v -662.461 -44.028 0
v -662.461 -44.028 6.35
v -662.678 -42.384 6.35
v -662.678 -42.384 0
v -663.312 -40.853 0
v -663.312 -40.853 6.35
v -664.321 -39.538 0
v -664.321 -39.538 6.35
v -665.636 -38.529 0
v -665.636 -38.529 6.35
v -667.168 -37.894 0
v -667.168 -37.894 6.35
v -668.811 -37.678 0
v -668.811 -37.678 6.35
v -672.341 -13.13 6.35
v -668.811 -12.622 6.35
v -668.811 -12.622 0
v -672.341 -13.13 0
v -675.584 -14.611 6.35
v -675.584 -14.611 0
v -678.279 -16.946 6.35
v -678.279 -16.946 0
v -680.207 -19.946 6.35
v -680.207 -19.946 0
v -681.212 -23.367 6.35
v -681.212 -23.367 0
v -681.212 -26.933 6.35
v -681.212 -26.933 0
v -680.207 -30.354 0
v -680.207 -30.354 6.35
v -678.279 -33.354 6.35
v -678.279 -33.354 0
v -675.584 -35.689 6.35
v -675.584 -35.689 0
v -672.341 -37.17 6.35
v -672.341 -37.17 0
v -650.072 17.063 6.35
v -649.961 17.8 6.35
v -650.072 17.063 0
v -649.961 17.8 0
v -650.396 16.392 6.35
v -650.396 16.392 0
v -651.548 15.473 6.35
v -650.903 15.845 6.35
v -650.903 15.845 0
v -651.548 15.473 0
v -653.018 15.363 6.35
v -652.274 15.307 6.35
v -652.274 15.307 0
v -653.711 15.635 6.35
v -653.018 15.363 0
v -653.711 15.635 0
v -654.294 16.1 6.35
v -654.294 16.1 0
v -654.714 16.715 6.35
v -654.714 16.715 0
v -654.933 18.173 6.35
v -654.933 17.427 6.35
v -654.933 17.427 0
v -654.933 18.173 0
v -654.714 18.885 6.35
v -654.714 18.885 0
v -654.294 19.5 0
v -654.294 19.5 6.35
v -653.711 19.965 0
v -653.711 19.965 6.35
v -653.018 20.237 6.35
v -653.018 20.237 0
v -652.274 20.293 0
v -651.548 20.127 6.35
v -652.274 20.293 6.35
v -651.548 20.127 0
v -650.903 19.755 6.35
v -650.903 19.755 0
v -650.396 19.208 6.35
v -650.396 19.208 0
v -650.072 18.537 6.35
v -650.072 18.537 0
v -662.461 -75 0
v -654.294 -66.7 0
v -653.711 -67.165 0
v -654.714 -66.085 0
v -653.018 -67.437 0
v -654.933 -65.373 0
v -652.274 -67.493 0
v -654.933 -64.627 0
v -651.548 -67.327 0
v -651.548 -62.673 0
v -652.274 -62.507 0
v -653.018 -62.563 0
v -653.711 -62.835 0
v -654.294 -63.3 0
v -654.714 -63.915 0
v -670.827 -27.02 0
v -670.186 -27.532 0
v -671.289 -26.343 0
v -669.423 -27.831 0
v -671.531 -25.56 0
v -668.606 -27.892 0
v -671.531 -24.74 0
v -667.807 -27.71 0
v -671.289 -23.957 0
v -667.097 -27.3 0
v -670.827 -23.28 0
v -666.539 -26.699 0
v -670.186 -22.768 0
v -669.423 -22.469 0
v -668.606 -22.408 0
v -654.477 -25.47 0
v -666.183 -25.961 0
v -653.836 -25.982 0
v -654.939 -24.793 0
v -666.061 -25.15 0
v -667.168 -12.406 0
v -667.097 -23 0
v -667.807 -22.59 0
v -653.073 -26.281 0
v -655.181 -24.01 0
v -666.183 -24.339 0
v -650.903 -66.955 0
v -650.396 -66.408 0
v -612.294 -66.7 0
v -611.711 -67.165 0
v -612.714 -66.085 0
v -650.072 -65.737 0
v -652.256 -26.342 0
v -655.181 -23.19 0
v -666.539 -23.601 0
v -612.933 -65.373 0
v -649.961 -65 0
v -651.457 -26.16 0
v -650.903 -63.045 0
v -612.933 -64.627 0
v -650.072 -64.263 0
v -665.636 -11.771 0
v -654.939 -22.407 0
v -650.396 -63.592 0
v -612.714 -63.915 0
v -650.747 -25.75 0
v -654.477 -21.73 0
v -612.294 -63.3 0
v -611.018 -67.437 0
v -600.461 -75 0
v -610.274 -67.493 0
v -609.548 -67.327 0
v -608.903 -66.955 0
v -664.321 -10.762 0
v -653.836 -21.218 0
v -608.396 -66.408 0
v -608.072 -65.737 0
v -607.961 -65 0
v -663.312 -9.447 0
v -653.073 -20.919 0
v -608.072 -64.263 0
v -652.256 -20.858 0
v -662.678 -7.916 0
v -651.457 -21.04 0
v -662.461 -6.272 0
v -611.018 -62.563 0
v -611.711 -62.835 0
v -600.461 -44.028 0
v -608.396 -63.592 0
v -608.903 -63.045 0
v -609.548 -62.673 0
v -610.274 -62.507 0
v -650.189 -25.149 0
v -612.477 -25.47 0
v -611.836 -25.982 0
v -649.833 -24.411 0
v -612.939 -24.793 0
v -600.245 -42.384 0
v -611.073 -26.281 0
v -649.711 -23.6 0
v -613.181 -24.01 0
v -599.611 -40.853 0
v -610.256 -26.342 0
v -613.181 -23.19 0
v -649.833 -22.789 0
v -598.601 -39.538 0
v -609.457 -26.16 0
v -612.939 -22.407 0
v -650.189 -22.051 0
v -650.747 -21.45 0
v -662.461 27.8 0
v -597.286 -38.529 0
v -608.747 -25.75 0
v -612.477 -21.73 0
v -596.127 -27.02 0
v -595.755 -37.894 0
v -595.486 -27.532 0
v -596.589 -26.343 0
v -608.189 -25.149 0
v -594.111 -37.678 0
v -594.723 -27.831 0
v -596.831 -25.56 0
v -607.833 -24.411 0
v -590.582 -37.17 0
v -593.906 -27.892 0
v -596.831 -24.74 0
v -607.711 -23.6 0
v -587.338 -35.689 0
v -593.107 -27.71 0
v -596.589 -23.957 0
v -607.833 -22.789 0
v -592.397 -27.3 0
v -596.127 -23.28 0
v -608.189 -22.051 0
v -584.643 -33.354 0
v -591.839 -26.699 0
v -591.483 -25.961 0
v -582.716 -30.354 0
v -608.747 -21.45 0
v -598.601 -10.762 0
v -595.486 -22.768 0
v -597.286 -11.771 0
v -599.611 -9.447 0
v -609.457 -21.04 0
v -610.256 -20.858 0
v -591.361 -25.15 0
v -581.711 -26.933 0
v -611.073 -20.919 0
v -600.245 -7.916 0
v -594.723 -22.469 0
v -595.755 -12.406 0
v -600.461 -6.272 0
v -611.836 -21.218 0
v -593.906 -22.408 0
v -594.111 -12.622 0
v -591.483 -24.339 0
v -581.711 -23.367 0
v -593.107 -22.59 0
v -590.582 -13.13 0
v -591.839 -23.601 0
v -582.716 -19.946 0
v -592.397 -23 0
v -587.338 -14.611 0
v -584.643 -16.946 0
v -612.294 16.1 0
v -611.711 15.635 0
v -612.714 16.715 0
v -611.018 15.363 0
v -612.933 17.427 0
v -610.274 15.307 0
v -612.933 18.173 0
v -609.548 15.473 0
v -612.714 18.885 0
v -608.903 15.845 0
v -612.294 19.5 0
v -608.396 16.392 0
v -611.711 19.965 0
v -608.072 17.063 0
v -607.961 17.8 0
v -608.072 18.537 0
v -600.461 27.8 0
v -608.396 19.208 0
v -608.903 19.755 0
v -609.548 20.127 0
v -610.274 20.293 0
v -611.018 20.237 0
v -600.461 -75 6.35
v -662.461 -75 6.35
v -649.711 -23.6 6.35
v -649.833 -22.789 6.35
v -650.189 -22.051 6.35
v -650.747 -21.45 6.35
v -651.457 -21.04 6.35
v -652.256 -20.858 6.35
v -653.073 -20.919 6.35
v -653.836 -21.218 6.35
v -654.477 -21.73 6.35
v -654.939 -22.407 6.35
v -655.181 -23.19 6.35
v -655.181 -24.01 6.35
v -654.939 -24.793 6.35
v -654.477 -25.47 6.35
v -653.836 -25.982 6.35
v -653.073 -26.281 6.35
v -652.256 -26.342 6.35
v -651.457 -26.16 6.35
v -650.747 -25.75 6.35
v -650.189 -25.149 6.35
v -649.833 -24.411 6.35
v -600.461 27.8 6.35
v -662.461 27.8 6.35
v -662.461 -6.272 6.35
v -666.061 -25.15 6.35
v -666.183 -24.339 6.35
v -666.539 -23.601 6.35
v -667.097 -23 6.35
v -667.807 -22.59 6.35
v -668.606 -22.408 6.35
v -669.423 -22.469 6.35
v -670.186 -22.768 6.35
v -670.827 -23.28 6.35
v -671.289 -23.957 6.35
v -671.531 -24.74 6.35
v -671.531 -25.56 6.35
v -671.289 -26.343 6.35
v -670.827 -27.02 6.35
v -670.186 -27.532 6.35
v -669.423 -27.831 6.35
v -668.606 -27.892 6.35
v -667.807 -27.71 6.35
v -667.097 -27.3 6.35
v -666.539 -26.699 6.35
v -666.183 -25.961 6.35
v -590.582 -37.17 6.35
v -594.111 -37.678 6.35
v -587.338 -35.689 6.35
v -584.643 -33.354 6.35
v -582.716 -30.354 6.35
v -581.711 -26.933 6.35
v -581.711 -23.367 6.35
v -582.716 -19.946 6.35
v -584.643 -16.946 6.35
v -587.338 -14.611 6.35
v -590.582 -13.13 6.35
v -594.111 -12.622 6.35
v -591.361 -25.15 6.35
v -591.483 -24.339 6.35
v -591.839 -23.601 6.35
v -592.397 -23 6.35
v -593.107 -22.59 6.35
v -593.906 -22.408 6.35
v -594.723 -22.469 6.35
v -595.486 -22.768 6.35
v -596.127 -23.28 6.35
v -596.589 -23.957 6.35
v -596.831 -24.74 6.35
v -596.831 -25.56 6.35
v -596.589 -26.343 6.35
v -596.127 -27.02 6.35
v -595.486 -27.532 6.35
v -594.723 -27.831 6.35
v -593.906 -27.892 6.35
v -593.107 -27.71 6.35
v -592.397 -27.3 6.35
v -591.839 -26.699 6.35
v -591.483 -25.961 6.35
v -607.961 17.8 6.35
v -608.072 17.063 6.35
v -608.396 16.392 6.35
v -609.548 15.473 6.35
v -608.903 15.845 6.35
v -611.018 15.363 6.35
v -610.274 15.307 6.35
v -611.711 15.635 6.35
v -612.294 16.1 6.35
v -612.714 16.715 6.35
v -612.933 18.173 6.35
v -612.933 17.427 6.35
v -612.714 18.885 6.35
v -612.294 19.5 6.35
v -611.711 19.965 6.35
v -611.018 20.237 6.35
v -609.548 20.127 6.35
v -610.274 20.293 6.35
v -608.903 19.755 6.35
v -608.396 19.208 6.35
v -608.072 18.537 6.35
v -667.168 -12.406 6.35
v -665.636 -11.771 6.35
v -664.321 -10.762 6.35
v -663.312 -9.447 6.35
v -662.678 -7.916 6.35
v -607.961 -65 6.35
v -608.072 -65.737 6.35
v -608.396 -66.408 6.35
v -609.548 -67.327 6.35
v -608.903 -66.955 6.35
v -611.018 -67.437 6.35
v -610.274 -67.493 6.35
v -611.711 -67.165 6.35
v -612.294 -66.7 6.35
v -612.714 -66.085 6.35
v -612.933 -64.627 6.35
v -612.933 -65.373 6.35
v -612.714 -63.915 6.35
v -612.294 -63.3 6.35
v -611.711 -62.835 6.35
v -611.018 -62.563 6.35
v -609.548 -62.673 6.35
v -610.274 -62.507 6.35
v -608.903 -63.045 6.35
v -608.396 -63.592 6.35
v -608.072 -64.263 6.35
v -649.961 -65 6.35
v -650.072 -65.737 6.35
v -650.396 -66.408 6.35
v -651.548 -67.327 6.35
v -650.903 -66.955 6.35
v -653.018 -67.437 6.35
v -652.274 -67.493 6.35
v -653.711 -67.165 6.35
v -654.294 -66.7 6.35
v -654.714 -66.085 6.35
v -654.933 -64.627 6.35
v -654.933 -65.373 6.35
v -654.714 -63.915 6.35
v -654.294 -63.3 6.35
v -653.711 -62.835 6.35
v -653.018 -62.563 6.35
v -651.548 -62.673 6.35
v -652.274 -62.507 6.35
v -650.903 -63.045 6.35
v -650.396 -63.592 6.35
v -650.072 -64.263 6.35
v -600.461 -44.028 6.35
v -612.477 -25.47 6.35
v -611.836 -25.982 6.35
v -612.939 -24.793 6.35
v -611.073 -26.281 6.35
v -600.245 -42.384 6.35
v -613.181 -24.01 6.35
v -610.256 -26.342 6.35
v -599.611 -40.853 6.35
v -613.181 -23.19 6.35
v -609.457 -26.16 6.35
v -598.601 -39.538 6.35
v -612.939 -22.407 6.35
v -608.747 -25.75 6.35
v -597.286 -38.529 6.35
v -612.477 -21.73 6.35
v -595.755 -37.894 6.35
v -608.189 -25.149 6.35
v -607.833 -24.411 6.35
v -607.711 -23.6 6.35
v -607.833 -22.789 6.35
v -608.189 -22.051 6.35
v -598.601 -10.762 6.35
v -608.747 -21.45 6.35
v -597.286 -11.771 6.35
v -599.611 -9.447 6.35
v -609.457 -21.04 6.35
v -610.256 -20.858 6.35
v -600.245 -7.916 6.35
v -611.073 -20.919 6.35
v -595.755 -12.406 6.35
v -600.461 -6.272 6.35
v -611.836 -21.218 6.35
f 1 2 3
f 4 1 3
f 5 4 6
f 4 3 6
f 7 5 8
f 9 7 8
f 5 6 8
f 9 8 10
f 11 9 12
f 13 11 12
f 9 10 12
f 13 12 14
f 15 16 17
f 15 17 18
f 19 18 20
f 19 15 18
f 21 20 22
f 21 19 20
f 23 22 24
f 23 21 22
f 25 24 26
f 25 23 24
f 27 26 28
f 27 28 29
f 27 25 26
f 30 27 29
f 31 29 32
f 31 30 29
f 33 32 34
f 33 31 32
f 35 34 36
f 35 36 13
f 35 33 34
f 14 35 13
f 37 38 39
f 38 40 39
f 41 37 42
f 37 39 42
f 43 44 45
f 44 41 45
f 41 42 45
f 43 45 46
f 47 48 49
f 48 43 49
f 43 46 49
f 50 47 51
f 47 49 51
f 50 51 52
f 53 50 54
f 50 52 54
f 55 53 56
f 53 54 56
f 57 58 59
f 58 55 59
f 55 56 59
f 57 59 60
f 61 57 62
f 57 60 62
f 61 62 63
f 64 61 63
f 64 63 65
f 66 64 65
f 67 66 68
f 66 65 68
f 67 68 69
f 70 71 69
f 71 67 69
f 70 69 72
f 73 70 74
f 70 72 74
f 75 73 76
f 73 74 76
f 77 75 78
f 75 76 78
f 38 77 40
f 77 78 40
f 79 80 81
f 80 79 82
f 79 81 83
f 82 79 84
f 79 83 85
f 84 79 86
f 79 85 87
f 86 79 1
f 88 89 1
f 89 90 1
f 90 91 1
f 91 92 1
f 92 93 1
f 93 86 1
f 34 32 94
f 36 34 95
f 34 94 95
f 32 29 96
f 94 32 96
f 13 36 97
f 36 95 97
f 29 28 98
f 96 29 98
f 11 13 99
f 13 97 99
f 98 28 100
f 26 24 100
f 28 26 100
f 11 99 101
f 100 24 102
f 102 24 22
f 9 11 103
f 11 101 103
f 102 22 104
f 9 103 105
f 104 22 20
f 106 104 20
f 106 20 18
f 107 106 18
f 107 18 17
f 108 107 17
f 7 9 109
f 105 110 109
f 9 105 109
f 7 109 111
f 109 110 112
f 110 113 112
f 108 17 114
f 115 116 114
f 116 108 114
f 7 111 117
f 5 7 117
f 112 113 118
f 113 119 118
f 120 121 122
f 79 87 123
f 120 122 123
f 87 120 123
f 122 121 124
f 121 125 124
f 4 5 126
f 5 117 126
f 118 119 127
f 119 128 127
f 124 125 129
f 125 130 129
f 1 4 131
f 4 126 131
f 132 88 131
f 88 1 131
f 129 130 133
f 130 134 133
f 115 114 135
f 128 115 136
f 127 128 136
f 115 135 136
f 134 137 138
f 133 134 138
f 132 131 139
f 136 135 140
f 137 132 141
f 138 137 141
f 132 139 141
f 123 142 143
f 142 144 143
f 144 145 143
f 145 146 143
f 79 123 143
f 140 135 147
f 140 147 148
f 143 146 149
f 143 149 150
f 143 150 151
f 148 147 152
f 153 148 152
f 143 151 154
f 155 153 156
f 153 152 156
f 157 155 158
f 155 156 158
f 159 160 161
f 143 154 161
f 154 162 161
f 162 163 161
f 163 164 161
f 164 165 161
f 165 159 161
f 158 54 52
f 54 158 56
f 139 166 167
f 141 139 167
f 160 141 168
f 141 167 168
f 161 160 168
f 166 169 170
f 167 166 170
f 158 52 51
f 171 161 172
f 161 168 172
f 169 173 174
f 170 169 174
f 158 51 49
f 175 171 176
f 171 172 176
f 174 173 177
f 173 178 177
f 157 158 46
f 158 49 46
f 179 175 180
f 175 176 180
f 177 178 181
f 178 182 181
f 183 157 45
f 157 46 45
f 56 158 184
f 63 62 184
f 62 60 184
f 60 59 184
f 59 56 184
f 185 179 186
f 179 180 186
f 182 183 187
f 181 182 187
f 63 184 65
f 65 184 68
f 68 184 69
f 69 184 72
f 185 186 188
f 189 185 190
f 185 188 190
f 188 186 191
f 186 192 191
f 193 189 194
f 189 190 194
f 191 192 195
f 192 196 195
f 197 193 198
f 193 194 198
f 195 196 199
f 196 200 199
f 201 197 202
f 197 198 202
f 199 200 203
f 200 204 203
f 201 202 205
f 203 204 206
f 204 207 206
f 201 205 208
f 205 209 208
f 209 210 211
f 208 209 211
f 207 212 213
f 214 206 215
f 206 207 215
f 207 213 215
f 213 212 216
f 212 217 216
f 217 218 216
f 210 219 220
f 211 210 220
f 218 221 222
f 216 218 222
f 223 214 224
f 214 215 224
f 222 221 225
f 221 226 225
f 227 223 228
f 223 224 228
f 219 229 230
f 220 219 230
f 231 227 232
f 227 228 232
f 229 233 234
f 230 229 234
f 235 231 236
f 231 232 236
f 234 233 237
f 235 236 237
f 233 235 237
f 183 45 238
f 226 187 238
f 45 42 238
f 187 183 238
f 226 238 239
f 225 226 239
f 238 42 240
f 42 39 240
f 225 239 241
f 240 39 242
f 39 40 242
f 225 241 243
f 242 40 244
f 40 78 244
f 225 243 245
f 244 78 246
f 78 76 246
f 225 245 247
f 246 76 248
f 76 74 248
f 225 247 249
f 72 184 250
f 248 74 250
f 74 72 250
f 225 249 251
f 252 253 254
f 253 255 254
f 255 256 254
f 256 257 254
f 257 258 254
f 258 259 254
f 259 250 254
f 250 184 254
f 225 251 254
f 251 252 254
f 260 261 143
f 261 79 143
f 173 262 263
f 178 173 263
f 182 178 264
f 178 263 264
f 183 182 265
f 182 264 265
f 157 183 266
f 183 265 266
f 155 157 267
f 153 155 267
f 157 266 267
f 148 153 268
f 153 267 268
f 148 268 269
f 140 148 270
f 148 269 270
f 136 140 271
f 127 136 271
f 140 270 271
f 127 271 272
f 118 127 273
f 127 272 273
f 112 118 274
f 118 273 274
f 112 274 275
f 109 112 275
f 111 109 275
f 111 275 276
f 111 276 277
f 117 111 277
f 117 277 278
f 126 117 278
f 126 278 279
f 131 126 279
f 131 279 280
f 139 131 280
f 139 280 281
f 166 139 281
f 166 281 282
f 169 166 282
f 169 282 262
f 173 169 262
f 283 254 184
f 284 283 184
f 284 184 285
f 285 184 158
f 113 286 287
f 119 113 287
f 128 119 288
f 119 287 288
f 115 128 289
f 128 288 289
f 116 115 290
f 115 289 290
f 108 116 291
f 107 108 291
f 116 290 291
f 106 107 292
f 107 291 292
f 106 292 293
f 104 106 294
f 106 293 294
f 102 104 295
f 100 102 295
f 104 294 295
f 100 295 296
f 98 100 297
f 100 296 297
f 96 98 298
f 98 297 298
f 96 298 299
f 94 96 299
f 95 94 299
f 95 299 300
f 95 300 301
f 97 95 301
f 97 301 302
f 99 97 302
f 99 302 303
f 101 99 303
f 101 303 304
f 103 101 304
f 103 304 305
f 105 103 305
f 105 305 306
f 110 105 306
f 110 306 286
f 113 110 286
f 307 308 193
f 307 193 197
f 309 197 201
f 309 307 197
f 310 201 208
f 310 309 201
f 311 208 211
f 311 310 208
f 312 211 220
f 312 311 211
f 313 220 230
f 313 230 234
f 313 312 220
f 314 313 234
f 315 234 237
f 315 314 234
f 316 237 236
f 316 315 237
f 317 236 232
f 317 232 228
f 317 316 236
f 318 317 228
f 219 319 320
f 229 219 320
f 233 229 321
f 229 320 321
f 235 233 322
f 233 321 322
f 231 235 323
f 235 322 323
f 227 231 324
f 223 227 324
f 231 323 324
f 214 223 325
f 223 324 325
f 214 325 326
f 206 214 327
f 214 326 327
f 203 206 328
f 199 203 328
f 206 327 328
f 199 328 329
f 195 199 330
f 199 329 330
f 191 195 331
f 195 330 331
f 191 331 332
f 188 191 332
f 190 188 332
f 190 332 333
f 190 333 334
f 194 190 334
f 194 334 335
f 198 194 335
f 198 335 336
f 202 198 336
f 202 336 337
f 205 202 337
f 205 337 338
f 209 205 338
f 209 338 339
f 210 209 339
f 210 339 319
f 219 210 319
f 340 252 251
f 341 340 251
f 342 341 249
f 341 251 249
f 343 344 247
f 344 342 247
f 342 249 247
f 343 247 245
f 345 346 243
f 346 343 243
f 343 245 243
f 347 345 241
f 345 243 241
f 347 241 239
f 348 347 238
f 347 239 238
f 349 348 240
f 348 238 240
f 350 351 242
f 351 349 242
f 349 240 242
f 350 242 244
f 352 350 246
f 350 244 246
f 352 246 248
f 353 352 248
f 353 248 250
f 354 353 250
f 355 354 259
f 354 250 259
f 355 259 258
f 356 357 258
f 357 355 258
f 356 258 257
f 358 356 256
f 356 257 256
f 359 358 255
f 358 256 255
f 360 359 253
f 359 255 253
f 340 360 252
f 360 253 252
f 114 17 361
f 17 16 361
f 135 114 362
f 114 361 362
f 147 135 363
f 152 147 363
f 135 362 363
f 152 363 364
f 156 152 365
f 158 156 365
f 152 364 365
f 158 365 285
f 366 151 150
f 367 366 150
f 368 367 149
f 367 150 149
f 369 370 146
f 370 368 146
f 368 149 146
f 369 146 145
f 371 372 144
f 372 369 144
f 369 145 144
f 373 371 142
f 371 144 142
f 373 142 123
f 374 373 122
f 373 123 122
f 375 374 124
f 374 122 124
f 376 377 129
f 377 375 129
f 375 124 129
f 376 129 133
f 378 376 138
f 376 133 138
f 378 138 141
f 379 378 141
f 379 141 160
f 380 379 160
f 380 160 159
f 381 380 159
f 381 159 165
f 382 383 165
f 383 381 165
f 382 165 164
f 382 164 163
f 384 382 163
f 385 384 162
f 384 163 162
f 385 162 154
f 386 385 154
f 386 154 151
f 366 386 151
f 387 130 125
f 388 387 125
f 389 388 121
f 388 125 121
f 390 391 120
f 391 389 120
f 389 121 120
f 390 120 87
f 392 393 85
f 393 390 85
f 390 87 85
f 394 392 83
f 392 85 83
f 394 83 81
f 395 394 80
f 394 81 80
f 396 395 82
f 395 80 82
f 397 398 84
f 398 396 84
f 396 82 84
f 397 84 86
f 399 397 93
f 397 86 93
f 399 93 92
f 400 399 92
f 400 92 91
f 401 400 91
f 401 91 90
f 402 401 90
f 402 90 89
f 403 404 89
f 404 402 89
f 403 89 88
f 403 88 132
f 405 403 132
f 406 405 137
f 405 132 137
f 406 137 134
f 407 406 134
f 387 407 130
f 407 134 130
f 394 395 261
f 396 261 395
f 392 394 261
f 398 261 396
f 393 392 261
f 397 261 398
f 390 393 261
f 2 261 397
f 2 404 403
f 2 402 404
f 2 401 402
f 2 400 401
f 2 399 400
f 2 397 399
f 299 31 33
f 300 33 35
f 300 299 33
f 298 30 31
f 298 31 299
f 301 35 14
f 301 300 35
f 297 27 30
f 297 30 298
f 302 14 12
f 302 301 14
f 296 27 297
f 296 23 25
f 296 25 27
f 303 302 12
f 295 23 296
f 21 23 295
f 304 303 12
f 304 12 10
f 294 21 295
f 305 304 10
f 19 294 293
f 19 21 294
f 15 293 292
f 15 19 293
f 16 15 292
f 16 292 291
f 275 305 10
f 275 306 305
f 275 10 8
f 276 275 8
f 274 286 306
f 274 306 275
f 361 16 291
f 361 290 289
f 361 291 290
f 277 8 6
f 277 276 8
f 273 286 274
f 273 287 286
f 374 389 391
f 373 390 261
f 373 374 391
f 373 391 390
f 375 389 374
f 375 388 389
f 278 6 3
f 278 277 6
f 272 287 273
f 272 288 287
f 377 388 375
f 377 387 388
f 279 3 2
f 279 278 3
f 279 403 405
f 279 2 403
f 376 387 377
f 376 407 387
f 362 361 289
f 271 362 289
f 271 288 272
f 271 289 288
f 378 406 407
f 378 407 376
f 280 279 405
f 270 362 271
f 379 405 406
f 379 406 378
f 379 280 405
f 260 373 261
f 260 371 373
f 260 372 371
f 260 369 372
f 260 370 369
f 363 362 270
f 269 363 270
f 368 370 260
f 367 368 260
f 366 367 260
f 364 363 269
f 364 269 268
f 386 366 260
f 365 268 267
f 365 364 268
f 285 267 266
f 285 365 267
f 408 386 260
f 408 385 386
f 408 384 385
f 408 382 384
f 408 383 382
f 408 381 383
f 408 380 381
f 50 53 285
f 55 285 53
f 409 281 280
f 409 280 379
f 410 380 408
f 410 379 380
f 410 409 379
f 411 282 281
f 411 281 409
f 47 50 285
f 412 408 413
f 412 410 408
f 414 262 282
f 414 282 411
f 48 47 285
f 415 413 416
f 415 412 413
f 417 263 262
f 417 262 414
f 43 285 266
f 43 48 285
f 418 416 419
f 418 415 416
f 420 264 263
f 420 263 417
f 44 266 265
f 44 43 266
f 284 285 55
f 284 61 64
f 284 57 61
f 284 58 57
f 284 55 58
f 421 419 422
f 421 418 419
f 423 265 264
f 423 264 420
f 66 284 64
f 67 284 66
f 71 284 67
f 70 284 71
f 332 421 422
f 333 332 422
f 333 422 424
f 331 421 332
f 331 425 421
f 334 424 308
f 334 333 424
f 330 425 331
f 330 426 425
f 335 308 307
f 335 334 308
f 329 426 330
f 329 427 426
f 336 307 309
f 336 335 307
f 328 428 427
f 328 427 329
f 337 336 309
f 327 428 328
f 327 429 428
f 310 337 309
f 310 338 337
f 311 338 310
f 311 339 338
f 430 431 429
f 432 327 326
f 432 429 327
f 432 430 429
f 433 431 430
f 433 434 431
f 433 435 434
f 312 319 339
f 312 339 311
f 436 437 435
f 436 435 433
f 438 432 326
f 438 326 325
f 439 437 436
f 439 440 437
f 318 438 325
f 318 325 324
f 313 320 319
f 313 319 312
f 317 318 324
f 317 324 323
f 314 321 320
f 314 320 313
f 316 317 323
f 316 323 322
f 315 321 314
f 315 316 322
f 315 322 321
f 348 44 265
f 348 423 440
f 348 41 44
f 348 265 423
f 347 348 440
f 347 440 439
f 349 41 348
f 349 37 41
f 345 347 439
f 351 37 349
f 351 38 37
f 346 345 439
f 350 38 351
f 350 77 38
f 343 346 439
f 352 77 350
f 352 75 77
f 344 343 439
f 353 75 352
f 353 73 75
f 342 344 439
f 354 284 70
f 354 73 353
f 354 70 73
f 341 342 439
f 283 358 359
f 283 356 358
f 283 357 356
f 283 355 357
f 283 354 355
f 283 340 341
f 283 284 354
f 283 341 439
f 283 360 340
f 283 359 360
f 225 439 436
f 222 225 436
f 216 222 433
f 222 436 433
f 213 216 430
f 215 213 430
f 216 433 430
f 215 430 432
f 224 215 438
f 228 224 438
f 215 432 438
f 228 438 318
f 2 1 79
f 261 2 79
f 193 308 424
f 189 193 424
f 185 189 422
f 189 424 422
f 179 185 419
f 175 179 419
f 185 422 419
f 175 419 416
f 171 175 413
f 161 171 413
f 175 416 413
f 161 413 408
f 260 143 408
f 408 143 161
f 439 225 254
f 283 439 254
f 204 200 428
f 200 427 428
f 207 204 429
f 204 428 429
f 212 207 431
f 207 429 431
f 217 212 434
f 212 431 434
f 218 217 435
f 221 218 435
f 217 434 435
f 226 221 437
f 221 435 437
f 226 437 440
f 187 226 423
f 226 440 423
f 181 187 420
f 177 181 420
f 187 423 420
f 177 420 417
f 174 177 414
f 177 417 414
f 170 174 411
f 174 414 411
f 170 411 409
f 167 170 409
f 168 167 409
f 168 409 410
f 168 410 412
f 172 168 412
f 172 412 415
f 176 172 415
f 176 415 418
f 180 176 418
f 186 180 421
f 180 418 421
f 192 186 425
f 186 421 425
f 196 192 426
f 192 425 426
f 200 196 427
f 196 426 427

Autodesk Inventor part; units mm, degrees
ref_plane "YZ Plane" through (0, 0, 0) normal (1, 0, 0) x (0, 1, 0)
ref_plane "XZ Plane" through (0, 0, 0) normal (0, 1, 0) x (-1, 0, 0)
ref_plane "XY Plane" through (0, 0, 0) normal (0, 0, 1) x (1, 0, 0)
sketch "Sketch1" plane through (0, 0, 0) normal (0, 0, 1) x (1, 0, 0)
  circle A0 centre (-610.4613, 17.8) radius 2.5 projected
  circle A1 centre (-610.4613, 17.8) radius 9.9 construction
  circle A2 centre (-652.4613, 17.8) radius 2.5 projected
  circle A3 centre (-652.4613, 17.8) radius 9.9 construction
  circle A4 centre (-610.4613, -65) radius 2.5 projected
  circle A5 centre (-610.4613, -65) radius 9.9 construction
  circle A6 centre (-652.4613, -65) radius 2.5 projected
  circle A7 centre (-652.4613, -65) radius 9.9 construction
  line L0 (-610.4613, -65) -> (-652.4613, -65) construction
  line L1 (-652.4613, -65) -> (-652.4613, 17.8) construction
  line L2 (-652.4613, 17.8) -> (-610.4613, 17.8) construction
  line L3 (-610.4613, 17.8) -> (-610.4613, -65) construction
  line L4 (-662.4613, -75) -> (-600.4613, -75)
  line L5 (-600.4613, -75) -> (-600.4613, 27.8)
  line L6 (-600.4613, 27.8) -> (-662.4613, 27.8)
  line L7 (-662.4613, 27.8) -> (-662.4613, -75)
  point P0 (0, 0)
  dimension "d0" = 10
extrude "Extrusion1" add sketch "Sketch1" along normal blind 6.35
sketch "Sketch2" plane through (0, 0, 6.35) normal (0, 0, 1) x (1, 0, 0)
  circle A0 centre (-610.4613, 17.8) radius 2.5 projected
  circle A1 centre (-610.4613, -65) radius 2.5 projected
  circle A2 centre (-652.4613, -65) radius 2.5 projected
  circle A3 centre (-652.4613, 17.8) radius 2.5 projected
  circle A4 centre (-652.4613, 17.8) radius 2.5 projected
  line L0 (-652.4613, 17.8) -> (-652.4613, -65) construction
  circle A5 centre (-610.4613, 17.8) radius 2.5 projected
  circle A6 centre (-610.4613, -65) radius 2.5 projected
  line L1 (-610.4613, 17.8) -> (-610.4613, -65) construction
  circle A7 centre (-610.4613, -23.6) radius 2.75
  circle A8 centre (-652.4613, -23.6) radius 2.75
  point P0 (0, 0)
  dimension "d3" = 5.5
extrude "Extrusion2" cut sketch "Sketch2" against normal blind 25.4 contours A7 | A8
sketch "Sketch3" plane through (0, 0, 6.35) normal (0, 0, 1) x (1, 0, 0)
  line L0 (-688.334, -23.6) -> (-567.3626, -23.6) construction
  line L1 (-600.4613, -75) -> (-600.4613, 27.8) construction
  line L2 (-662.4613, 27.8) -> (-662.4613, -75) construction
  line L3 (-594.1113, -75) -> (-594.1113, 27.8) construction
  line L4 (-668.8113, 24.7) -> (-668.8113, -75) construction
  circle A0 centre (-668.8113, -25.15) radius 2.75
  arc A1 (-668.8113, -12.6221) -> (-668.8113, -37.6779) centre (-668.8113, -25.15) ccw
  line L5 (-600.4613, -75) -> (-600.4613, 27.8) projected
  arc A2 (-662.4613, -44.0279) -> (-668.8113, -37.6779) centre (-668.8113, -44.0279) ccw
  arc A3 (-668.8113, -12.6221) -> (-662.4613, -6.2721) centre (-668.8113, -6.2721) ccw
  line L6 (-668.8113, -6.2721) -> (-662.4613, -6.2721) construction
  line L7 (-668.8113, -6.2721) -> (-668.8113, -12.6221) construction
  line L8 (-600.4613, 27.8) -> (-662.4613, 27.8) construction
  line L9 (-631.4613, 27.8) -> (-631.4613, -75) construction
  line L10 (-662.4613, -75) -> (-600.4613, -75) construction
  circle A4 centre (-594.1113, -25.15) radius 2.75
  arc A5 (-594.1113, -37.6779) -> (-594.1113, -12.6221) centre (-594.1113, -25.15) ccw
  arc A6 (-594.1113, -37.6779) -> (-600.4613, -44.0279) centre (-594.1113, -44.0279) ccw
  arc A7 (-600.4613, -6.2721) -> (-594.1113, -12.6221) centre (-594.1113, -6.2721) ccw
  line L11 (-594.1113, -6.2721) -> (-600.4613, -6.2721) construction
  line L12 (-594.1113, -6.2721) -> (-594.1113, -12.6221) construction
  line L13 (-662.4613, -6.2721) -> (-662.4613, -44.0279) construction
  line L14 (-662.4613, -6.2721) -> (-662.4613, -44.0279)
  line L15 (-600.4613, -44.0279) -> (-600.4613, -6.2721)
  point P0 (0, 0)
  point P1 (-574.5885, -23.6)
  dimension "d6" = 6.35
  dimension "d7" = 6.35
  dimension "d9" = 6.35
  dimension "d10" = 90
  dimension "d11" = 6.35
  dimension "d14" = 1.55
  dimension "d15" = 51.4
extrude "Extrusion3" add sketch "Sketch3" against normal up to surface (6.35 mm away)
properties part number "yCarraige"
